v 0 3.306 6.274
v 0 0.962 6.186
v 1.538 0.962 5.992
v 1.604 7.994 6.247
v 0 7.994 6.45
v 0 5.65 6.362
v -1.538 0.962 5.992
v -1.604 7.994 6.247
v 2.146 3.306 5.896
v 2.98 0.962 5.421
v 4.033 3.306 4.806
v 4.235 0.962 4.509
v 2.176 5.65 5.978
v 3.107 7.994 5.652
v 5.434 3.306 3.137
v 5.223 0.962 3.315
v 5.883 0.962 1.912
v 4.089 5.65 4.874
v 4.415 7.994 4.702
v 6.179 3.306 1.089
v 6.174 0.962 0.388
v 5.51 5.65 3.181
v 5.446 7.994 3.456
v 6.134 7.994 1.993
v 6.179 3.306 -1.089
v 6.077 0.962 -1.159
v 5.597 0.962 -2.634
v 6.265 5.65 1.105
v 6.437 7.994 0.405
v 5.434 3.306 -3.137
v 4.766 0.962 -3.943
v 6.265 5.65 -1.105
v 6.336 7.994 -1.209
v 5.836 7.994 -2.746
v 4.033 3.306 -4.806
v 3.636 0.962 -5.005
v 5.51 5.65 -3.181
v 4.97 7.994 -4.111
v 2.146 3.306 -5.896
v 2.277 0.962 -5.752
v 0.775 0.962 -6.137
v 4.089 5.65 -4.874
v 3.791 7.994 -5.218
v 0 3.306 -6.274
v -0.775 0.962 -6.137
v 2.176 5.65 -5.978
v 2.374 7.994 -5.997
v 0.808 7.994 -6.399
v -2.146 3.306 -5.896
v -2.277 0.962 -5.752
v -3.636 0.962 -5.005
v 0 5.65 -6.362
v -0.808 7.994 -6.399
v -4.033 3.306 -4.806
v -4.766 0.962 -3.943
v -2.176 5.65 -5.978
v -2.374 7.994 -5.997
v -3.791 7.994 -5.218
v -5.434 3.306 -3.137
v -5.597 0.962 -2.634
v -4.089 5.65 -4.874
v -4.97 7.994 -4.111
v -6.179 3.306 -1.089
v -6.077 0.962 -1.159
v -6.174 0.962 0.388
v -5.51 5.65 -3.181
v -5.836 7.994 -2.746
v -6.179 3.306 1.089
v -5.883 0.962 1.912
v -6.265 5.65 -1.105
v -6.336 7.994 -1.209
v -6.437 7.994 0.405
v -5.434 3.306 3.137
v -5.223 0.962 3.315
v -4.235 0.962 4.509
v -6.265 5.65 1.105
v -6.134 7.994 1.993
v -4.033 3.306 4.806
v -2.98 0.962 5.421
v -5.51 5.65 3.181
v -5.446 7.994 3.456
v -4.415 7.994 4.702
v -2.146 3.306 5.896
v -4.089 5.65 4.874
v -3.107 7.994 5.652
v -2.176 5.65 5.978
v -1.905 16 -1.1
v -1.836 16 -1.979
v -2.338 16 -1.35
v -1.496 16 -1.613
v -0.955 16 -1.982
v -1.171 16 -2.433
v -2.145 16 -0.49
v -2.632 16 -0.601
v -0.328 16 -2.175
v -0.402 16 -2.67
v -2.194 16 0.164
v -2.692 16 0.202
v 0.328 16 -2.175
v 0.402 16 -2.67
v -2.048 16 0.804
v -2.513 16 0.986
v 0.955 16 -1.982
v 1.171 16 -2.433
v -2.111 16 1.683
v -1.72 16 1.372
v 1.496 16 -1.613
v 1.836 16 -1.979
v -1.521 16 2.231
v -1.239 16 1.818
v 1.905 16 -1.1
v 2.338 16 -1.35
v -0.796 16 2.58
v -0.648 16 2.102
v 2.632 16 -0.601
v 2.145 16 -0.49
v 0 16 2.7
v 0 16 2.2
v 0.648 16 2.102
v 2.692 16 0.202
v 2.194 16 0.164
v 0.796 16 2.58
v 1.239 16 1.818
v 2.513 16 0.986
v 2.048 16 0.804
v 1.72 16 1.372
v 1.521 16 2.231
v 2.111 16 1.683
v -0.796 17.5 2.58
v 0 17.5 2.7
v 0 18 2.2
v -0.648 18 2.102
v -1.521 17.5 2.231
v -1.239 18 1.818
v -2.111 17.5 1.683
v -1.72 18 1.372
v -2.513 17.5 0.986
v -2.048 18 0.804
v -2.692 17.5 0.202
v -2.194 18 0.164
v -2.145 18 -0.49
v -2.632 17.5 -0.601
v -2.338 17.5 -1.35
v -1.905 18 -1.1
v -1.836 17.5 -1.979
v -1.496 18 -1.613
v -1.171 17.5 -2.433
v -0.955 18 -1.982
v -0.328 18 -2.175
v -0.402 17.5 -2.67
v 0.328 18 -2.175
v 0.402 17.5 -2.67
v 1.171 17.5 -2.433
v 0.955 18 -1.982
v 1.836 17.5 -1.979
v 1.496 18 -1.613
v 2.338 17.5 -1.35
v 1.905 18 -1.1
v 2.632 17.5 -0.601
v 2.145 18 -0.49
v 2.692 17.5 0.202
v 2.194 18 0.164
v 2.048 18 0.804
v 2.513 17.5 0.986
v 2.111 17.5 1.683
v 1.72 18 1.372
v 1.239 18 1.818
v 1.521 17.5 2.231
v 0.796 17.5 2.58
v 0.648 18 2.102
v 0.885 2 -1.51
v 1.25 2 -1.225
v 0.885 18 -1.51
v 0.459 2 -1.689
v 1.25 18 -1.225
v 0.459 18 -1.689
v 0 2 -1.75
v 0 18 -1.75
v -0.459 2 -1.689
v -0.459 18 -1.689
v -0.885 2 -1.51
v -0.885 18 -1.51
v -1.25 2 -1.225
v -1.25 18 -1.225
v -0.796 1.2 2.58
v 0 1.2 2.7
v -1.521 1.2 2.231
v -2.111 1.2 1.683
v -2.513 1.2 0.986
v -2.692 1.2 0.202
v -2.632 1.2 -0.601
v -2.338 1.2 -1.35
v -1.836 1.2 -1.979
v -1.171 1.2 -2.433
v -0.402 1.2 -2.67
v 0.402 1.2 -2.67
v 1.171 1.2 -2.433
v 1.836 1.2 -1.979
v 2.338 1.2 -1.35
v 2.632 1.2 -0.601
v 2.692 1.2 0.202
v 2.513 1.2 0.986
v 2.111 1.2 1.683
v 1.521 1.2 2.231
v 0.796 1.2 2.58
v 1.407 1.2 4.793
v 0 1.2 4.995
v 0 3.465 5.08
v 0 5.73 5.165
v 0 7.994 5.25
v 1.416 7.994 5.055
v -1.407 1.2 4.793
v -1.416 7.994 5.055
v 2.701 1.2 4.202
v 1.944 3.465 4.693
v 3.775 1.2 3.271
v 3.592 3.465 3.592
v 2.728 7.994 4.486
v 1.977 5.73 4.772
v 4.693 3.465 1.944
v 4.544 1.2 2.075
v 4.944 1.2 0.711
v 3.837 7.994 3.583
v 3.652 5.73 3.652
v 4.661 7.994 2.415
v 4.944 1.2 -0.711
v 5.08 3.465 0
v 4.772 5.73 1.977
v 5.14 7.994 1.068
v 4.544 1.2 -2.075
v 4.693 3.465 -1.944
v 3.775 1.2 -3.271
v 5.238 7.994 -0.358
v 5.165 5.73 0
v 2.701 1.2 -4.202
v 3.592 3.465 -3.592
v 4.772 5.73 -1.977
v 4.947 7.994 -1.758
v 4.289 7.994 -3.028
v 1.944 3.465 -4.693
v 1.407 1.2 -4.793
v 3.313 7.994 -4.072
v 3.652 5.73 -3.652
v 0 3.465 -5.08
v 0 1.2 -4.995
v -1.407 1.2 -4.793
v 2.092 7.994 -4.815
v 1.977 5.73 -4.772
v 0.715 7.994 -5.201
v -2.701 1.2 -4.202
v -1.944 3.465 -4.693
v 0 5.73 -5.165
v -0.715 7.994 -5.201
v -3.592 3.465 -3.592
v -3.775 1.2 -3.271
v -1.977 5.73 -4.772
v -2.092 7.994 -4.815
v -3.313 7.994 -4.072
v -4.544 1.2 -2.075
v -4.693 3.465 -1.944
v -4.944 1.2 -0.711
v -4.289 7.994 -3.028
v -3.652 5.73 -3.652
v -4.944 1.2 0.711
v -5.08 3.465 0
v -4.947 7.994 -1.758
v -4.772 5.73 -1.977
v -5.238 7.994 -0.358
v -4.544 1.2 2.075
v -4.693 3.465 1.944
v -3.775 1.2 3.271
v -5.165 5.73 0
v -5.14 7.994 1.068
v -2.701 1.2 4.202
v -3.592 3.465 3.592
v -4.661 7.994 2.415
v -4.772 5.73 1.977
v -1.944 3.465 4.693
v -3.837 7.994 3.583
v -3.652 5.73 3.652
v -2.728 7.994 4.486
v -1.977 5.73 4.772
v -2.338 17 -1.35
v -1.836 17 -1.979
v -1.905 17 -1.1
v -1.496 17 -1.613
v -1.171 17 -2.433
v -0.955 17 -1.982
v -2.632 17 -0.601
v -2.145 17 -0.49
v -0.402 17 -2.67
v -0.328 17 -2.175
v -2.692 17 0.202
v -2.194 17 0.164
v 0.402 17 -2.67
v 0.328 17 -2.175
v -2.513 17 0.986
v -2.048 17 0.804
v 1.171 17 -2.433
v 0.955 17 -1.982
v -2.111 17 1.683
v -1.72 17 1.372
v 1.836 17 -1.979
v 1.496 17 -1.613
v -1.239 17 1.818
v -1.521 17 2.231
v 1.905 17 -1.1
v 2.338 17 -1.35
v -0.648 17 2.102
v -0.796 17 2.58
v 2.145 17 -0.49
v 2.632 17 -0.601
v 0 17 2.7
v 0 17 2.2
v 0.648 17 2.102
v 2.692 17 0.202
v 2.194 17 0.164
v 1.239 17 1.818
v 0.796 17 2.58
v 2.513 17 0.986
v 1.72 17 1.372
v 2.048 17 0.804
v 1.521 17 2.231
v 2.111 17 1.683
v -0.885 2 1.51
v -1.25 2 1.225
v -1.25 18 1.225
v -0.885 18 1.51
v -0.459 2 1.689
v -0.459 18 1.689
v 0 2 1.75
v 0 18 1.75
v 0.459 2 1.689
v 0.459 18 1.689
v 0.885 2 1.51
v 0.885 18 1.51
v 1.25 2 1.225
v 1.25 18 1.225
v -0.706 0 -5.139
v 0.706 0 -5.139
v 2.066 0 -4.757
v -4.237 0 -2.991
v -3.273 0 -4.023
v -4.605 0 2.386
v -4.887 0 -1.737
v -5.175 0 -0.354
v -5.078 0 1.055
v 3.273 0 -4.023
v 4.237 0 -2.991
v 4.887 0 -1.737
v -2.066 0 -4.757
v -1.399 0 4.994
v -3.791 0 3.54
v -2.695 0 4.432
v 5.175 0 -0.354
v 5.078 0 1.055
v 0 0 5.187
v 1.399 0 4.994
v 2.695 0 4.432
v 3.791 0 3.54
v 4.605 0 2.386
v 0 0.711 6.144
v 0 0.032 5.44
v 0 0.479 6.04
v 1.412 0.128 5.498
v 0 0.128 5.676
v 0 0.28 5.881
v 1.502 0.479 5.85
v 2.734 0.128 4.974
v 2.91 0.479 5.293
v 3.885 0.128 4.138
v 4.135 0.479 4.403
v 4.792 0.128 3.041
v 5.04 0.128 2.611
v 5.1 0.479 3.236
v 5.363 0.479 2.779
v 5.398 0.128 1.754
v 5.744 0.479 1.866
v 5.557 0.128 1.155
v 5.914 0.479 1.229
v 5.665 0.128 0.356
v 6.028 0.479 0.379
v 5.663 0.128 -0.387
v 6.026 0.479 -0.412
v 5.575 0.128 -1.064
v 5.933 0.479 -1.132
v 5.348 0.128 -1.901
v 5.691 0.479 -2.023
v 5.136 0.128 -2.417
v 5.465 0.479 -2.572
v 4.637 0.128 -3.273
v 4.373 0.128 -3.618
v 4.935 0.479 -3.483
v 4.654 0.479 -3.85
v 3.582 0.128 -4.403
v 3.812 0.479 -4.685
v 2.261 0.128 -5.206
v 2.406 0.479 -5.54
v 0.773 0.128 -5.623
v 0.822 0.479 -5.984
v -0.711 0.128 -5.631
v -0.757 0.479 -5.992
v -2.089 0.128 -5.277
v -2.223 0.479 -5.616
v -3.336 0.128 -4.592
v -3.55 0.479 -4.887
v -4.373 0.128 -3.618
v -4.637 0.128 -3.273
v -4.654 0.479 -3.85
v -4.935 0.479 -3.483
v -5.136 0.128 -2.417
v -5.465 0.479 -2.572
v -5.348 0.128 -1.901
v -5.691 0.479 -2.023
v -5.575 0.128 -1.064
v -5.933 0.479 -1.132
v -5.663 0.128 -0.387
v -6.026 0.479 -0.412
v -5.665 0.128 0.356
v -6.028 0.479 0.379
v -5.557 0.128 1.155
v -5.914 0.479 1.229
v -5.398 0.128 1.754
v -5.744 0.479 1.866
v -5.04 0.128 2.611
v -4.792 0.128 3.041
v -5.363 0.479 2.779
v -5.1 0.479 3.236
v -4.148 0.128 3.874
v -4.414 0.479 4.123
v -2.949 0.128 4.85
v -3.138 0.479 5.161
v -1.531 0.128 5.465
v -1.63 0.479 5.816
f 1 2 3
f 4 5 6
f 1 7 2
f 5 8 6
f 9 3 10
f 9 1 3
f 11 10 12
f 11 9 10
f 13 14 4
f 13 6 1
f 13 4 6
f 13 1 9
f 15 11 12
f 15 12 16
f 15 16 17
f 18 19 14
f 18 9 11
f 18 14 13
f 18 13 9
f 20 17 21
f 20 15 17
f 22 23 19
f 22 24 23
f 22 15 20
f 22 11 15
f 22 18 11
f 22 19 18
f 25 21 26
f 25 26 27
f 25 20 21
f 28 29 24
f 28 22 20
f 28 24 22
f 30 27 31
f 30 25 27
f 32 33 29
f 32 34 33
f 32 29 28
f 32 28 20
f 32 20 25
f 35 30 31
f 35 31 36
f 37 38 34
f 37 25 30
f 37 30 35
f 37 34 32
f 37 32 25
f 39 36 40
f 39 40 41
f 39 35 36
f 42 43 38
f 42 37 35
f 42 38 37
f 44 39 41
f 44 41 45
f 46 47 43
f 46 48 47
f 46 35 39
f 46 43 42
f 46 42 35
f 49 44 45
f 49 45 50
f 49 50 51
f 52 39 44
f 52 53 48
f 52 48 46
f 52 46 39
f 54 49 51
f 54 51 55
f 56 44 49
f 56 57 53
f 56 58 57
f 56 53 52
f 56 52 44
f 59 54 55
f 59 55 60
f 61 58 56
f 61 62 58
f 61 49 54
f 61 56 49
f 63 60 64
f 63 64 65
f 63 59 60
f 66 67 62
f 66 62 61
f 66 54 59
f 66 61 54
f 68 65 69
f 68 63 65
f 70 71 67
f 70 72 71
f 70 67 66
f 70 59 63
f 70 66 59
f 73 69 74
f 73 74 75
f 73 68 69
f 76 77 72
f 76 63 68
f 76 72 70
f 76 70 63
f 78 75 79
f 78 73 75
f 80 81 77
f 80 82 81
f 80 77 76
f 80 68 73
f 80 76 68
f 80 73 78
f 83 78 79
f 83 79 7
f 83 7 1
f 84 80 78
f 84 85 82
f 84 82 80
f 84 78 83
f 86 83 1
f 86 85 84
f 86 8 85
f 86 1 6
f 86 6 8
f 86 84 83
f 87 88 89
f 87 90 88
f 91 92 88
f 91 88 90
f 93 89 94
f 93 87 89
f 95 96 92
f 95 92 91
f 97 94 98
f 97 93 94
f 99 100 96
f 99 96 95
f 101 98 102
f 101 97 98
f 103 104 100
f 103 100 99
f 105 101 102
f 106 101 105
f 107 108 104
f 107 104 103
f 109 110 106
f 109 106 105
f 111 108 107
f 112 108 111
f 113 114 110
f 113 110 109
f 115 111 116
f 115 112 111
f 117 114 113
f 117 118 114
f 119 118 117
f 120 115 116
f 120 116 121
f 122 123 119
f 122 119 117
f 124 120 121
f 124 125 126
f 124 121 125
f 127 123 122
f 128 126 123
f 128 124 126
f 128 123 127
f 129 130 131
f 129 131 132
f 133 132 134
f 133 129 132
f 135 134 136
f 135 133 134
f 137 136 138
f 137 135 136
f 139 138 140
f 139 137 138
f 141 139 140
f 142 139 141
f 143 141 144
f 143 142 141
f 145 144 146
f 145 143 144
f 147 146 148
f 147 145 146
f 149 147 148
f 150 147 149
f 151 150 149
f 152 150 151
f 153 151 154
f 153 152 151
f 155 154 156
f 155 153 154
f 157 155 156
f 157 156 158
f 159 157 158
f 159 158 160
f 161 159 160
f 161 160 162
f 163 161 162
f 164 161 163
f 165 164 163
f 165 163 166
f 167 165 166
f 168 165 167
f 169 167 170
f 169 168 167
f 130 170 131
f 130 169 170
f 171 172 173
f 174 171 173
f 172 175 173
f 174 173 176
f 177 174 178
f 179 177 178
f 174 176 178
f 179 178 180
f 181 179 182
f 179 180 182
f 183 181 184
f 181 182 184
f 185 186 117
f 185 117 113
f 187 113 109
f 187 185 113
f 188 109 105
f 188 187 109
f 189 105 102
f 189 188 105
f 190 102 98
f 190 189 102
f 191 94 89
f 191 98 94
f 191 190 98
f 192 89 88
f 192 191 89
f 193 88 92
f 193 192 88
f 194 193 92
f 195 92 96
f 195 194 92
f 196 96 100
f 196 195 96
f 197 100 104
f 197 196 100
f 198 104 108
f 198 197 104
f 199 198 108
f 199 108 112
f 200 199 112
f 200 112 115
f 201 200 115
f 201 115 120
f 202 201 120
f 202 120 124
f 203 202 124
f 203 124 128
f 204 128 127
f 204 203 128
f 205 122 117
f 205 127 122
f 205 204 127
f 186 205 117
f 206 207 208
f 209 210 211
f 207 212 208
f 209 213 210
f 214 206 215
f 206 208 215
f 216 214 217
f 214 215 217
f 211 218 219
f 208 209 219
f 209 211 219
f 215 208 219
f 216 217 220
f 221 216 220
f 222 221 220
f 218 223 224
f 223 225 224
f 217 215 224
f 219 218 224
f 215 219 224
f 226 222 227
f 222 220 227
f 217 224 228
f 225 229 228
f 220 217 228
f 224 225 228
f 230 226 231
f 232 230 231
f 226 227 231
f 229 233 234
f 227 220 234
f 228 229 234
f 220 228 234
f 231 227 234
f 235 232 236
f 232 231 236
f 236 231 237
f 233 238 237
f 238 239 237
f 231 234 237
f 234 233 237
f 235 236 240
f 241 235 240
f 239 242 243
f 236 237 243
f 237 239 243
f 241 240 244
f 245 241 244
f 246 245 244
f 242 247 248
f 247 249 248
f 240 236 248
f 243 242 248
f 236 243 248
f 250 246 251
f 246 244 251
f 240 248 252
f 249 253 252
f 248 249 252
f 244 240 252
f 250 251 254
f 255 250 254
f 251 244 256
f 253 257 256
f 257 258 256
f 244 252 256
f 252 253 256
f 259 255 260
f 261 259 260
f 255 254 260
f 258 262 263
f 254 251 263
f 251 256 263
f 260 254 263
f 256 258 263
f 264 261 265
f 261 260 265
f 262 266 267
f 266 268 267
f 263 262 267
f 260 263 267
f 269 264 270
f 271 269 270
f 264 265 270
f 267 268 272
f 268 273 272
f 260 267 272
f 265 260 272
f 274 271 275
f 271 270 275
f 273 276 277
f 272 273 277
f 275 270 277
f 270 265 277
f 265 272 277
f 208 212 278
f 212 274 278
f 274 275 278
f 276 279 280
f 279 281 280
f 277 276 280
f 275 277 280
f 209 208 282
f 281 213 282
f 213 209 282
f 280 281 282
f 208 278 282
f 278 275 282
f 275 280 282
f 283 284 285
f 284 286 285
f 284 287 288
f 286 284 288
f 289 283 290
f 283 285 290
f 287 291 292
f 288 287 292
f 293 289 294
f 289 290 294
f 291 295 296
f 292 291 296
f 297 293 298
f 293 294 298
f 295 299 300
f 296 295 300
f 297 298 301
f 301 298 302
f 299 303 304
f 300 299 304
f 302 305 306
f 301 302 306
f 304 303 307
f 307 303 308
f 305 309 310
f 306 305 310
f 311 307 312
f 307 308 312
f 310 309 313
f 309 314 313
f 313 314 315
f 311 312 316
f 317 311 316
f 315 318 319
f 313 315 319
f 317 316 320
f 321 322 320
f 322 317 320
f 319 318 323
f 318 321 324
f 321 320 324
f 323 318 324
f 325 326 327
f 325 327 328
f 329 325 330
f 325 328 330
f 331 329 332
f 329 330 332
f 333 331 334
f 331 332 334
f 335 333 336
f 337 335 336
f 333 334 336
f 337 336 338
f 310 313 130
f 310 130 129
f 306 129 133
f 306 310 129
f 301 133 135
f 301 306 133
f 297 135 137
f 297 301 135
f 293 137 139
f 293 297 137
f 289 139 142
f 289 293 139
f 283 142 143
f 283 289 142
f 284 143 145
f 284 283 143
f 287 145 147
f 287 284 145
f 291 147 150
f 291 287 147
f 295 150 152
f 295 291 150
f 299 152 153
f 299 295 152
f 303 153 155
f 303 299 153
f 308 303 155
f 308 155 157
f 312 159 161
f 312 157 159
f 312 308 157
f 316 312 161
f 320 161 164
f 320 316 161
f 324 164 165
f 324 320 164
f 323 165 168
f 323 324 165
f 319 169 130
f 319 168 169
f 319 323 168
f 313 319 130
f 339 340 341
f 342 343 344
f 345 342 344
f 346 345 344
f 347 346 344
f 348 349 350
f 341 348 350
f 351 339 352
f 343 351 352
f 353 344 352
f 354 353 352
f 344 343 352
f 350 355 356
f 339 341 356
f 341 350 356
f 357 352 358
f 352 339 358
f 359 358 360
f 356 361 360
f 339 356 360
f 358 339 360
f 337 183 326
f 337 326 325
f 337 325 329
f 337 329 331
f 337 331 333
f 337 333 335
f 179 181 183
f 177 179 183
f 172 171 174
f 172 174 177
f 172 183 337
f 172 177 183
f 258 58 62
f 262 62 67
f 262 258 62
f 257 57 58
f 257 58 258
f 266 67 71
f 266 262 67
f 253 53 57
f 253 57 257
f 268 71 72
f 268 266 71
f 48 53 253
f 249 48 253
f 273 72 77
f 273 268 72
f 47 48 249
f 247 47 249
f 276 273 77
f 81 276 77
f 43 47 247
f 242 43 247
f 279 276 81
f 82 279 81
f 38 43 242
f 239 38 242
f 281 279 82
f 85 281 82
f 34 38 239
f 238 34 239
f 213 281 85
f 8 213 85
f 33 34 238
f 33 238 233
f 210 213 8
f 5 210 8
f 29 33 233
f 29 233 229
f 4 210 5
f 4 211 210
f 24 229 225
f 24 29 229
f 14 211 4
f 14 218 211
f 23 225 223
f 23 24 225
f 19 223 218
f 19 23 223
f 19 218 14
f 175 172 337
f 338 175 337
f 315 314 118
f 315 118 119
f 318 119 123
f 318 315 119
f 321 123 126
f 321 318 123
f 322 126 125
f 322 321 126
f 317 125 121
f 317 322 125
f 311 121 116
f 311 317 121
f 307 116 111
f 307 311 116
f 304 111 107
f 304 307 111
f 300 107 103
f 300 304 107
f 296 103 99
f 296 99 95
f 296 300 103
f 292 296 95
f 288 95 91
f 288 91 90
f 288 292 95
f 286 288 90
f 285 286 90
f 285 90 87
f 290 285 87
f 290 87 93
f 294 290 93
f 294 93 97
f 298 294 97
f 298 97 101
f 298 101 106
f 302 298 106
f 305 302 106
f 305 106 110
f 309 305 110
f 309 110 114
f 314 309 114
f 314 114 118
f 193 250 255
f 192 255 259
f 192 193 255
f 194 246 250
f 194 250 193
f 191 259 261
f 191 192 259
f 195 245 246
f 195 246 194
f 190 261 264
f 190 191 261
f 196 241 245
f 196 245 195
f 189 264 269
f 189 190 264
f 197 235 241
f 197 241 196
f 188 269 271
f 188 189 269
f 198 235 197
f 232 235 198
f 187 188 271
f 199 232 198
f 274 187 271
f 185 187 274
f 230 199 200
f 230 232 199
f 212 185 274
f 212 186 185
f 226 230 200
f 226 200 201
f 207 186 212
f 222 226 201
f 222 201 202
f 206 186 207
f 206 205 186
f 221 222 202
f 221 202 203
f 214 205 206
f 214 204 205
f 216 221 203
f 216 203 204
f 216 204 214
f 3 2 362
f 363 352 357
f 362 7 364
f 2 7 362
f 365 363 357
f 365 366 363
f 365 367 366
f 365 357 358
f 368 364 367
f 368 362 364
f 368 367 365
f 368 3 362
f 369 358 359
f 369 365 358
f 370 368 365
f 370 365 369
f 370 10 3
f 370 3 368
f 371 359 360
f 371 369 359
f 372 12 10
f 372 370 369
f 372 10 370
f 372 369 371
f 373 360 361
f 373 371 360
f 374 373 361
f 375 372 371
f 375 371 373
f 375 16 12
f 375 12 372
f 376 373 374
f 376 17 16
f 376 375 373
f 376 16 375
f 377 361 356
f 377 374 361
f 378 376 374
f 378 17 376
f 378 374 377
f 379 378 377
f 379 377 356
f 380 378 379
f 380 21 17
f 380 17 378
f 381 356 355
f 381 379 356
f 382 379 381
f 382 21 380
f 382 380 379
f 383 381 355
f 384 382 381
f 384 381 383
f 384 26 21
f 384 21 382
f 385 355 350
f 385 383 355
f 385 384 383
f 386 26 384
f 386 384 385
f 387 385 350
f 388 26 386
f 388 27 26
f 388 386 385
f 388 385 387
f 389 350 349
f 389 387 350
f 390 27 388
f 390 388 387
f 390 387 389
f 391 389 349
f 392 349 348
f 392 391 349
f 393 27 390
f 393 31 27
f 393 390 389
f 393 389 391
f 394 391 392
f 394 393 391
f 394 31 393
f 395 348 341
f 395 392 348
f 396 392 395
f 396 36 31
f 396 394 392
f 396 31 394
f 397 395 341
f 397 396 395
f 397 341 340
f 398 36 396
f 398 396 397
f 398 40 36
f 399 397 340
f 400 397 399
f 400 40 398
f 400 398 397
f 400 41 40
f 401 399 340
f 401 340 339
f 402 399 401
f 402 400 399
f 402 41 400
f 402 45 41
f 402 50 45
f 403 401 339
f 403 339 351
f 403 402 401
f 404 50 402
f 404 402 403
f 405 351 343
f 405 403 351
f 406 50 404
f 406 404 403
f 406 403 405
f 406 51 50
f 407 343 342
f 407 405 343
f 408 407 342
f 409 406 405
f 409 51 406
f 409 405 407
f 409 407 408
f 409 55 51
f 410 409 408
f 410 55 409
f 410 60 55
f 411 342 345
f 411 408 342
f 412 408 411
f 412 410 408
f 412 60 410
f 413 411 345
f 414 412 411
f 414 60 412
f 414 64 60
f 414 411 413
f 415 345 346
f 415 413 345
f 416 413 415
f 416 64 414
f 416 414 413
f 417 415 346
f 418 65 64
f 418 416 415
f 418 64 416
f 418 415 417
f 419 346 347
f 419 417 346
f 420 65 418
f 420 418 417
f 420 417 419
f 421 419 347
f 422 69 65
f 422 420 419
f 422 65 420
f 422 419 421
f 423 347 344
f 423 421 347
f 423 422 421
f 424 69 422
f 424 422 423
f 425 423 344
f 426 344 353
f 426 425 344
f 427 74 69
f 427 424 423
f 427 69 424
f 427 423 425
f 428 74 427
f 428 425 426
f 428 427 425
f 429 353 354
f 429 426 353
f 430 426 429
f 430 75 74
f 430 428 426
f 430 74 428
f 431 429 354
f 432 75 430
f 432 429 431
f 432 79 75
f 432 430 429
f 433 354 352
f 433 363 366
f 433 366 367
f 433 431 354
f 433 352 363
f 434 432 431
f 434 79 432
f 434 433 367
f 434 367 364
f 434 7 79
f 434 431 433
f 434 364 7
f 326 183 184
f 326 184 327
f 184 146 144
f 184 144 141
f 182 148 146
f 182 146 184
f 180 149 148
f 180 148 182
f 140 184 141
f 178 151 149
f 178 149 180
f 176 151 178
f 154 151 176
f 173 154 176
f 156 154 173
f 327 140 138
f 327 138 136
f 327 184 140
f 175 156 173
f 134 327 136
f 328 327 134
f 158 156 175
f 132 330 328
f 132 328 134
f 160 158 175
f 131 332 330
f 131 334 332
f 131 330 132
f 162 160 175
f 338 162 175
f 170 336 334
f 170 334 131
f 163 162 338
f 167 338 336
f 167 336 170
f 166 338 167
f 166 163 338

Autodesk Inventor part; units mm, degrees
ref_plane "YZ Plane" through (0, 0, 0) normal (1, 0, 0) x (0, 1, 0)
ref_plane "XZ Plane" through (0, 0, 0) normal (0, 1, 0) x (-1, 0, 0)
ref_plane "XY Plane" through (0, 0, 0) normal (0, 0, 1) x (1, 0, 0)
sketch "Эскиз1" plane through (0, 0, 0) normal (1, 0, 0) x (0, 1, 0)
  line L0 (0, 0) -> (35, 0)
  line L1 (0, 0) -> (0, 6.15)
  line L2 (0, 6.15) -> (7.9944, 6.45)
  line L3 (7.9944, 6.45) -> (7.9944, 5.25)
  line L4 (7.9944, 5.25) -> (1.2, 4.995)
  line L5 (1.2, 4.995) -> (1.2, 2.7)
  line L6 (18, 2.7) -> (18, 0)
  line L7 (16, 2.7) -> (16, 2.2)
  line L8 (16, 2.2) -> (17, 2.2)
  line L9 (17, 2.2) -> (17, 2.7)
  line L10 (18, 2.7) -> (17, 2.7)
  line L11 (16, 2.7) -> (1.2, 2.7)
  point P0 (0, 3.075)
  dimension "d0" = 35
  dimension "d1" = 6.15
  dimension "d2" = 8
  dimension "d4" = 18
  dimension "d5" = 2.7
  dimension "d6" = 6.45
  dimension "d7" = 1.2
  dimension "d8" = 1.2
  dimension "d11" = 1
  dimension "d12" = 1
  dimension "d21" = 0.5
  dimension "d22" = 0
revolve "Вращение1" add sketch "Эскиз1" angle 360 about axis through (0, 0, 0) along (0, 1, 0)
fillet "Сопряжение1" radius 1 1 edges at (0, 0, -6.15)
sketch "Эскиз2" plane through (0, 18, 0) normal (0, 1, 0) x (1, 0, 0)
  circle A0 centre (0, 0) radius 1.75
  line L0 (-1.25, 1.2247) -> (-1.25, -1.2247)
  line L1 (1.25, 1.2247) -> (1.25, -1.2247)
  dimension "d13" = 3.5
  dimension "d19" = 1.25
  dimension "d20" = 1.25
extrude "Выдавливание1" cut sketch "Эскиз2" against normal blind 16 contours L1 A0 L0
chamfer "Фаска1" distance 0.5 angle 45 1 edges at (0, 18, -2.7)
properties part number "Кнопка для кухонной плиты (Укороченная)"
